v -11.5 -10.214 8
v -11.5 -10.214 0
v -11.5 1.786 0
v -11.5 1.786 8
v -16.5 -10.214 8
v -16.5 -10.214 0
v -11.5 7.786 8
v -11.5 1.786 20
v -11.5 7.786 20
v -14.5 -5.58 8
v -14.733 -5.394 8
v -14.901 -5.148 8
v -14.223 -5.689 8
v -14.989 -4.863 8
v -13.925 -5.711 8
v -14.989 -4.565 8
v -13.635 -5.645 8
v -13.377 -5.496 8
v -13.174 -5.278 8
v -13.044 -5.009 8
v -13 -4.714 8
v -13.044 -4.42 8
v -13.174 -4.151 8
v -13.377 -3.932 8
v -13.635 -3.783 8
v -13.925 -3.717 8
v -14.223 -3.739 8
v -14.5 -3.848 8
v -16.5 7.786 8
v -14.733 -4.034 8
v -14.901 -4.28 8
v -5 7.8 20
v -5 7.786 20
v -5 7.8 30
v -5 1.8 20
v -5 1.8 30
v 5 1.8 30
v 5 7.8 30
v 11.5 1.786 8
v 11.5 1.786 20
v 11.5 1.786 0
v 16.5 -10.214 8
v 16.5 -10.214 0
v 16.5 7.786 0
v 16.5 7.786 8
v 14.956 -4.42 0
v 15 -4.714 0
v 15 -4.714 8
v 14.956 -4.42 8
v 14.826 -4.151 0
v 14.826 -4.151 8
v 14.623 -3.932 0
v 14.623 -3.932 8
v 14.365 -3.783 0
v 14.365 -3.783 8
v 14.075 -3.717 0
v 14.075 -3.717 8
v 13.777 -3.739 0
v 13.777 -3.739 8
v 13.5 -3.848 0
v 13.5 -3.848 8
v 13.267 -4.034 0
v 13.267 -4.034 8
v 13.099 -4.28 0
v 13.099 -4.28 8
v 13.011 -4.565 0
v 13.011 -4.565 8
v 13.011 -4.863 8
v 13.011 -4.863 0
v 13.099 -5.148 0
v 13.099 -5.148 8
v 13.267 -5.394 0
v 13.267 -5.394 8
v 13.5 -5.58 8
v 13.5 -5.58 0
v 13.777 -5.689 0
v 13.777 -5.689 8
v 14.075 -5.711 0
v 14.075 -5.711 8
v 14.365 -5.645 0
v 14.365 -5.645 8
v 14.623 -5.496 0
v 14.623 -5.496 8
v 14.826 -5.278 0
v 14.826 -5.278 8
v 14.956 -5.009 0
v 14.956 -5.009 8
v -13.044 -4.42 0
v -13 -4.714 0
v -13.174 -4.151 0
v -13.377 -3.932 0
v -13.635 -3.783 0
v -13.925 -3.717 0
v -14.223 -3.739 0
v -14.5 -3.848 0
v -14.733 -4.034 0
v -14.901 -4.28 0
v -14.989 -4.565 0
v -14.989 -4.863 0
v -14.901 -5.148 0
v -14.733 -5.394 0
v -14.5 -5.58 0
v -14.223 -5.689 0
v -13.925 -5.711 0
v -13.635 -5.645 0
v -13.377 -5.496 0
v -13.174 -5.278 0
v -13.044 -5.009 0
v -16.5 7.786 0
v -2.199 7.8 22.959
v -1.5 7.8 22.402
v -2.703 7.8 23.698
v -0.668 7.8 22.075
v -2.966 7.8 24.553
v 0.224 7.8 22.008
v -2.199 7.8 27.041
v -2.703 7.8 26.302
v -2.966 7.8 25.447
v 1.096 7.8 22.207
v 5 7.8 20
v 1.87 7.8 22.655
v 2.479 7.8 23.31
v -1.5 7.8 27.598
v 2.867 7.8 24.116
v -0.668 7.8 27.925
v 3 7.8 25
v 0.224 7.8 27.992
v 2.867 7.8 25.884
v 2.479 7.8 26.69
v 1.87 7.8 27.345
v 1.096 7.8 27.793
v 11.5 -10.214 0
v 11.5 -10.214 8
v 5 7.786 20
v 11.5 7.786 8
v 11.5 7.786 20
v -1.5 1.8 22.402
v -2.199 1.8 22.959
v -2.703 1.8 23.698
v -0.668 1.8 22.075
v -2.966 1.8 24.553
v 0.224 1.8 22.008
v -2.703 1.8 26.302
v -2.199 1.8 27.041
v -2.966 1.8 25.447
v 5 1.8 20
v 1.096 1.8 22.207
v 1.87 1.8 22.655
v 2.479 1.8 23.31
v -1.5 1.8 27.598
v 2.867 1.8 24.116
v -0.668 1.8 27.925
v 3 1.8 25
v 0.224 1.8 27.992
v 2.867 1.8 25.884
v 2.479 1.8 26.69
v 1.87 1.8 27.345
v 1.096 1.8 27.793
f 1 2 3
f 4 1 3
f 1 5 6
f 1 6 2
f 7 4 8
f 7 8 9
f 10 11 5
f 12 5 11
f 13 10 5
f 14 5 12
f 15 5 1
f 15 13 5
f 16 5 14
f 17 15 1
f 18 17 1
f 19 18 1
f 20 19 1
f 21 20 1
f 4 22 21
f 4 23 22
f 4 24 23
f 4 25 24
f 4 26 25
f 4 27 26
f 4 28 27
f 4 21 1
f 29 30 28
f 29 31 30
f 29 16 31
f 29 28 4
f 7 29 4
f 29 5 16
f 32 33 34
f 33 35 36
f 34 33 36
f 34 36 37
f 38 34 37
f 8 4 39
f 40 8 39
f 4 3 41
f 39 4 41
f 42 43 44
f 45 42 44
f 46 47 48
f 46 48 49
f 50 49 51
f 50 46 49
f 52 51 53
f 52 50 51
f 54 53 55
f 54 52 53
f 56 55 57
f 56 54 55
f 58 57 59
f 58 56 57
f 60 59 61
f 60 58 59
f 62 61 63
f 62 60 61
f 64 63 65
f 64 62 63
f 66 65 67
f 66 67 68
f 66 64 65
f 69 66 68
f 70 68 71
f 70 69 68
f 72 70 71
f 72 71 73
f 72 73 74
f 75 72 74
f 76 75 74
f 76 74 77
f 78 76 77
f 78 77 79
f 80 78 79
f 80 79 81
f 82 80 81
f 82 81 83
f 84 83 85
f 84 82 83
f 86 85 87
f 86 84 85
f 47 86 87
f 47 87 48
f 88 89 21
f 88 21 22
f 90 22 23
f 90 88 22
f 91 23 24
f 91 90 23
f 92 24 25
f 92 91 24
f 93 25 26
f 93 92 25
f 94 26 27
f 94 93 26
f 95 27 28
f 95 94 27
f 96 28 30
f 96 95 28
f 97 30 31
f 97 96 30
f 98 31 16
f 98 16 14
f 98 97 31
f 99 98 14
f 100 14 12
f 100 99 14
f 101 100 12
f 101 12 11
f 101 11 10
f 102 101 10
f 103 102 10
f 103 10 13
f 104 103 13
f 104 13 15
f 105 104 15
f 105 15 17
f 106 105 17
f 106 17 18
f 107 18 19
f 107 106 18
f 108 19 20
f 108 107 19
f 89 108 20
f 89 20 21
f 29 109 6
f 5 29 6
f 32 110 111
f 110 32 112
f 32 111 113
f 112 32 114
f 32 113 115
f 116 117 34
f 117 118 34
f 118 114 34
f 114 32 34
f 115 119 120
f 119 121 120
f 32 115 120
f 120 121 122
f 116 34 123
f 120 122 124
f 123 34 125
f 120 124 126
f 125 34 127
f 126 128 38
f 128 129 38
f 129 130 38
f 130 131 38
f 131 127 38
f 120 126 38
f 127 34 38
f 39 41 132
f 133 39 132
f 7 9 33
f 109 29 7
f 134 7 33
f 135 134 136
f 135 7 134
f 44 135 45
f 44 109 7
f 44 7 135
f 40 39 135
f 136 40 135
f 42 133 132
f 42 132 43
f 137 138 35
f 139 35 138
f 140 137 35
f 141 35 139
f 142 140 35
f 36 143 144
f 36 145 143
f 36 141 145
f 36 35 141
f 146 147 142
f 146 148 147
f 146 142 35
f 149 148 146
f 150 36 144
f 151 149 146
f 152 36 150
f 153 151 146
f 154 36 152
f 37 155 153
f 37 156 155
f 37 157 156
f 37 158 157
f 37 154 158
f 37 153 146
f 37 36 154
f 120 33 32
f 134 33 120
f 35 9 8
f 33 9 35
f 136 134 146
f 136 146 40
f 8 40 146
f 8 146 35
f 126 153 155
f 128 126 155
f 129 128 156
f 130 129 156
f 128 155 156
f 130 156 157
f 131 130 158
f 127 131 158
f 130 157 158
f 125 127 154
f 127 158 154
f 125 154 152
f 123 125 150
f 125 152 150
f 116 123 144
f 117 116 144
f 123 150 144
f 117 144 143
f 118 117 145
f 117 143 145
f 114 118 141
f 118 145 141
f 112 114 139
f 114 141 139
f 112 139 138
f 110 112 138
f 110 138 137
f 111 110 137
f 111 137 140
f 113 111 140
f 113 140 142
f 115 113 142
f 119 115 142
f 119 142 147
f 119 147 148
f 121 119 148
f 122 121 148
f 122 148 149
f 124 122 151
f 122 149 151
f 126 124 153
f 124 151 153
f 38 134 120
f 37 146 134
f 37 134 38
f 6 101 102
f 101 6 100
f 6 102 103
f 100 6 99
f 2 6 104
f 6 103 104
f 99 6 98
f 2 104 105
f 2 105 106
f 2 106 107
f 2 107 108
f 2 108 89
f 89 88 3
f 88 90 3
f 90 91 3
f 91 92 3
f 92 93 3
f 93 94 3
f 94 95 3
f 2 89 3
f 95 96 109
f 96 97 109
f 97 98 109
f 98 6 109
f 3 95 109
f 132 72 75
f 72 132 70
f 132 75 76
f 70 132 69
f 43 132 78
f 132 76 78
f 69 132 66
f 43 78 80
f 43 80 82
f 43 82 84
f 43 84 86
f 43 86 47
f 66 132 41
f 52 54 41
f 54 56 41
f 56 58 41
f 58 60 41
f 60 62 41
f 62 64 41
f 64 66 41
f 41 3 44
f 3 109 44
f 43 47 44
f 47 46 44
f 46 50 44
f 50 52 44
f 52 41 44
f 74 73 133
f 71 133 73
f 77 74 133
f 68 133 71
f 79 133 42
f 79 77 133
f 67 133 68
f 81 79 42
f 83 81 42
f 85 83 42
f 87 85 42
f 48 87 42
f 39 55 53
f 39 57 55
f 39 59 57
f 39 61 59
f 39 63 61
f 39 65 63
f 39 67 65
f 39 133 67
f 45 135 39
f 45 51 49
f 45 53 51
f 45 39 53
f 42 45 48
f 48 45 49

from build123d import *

# Parameters (mm, degrees)
F0_R     = 1
F1_DEPTH = 8
F0_W     = 23
F0_H     = 6
F2_DEPTH = 20
F4_START = -1.8
F3_W     = 10
F3_H     = 10
F3_R     = 3
F4_DEPTH = 6


with BuildPart() as f1:
    # F0 (on Top) → F1 (new body)
    with BuildSketch(Plane.XY):
        Polygon((-11.5, 1.7857142857), (-11.5, 7.7857142857), (-16.5, 7.7857142857), (-16.5, -10.2142857143), (-11.5, -10.2142857143), align=None)
        with Locations((-14, -4.7142857143)):
            Circle(F0_R, mode=Mode.SUBTRACT)
    extrude(amount=F1_DEPTH)



with BuildPart() as f1b:
    # F0 (on Top) → F1, piece 2 (new body)
    with BuildSketch(Plane.XY):
        Polygon((16.5, 7.7857142857), (11.5, 7.7857142857), (11.5, 1.7857142857), (11.5, -10.2142857143), (16.5, -10.2142857143), align=None)
        with Locations((14, -4.7142857143)):
            Circle(F0_R, mode=Mode.SUBTRACT)
    extrude(amount=F1_DEPTH)


with BuildPart() as f1_1:
    add(f1.part)

    add(f1b.part)  # F2 merges F1b
    # F0 (on Top) → F2 (join)
    with BuildSketch(Plane.XY):
        with Locations((0, 4.7857142857)):
            Rectangle(F0_W, F0_H)
    extrude(amount=F2_DEPTH)

    # F3 (on Front) → F4 (join)
    with BuildSketch(Plane.XZ.offset(F4_START)):
        with Locations((0, 25)):
            Rectangle(F3_W, F3_H)
        with Locations((0, 25)):
            Circle(F3_R, mode=Mode.SUBTRACT)
    extrude(amount=-F4_DEPTH)


solid = f1_1.part
